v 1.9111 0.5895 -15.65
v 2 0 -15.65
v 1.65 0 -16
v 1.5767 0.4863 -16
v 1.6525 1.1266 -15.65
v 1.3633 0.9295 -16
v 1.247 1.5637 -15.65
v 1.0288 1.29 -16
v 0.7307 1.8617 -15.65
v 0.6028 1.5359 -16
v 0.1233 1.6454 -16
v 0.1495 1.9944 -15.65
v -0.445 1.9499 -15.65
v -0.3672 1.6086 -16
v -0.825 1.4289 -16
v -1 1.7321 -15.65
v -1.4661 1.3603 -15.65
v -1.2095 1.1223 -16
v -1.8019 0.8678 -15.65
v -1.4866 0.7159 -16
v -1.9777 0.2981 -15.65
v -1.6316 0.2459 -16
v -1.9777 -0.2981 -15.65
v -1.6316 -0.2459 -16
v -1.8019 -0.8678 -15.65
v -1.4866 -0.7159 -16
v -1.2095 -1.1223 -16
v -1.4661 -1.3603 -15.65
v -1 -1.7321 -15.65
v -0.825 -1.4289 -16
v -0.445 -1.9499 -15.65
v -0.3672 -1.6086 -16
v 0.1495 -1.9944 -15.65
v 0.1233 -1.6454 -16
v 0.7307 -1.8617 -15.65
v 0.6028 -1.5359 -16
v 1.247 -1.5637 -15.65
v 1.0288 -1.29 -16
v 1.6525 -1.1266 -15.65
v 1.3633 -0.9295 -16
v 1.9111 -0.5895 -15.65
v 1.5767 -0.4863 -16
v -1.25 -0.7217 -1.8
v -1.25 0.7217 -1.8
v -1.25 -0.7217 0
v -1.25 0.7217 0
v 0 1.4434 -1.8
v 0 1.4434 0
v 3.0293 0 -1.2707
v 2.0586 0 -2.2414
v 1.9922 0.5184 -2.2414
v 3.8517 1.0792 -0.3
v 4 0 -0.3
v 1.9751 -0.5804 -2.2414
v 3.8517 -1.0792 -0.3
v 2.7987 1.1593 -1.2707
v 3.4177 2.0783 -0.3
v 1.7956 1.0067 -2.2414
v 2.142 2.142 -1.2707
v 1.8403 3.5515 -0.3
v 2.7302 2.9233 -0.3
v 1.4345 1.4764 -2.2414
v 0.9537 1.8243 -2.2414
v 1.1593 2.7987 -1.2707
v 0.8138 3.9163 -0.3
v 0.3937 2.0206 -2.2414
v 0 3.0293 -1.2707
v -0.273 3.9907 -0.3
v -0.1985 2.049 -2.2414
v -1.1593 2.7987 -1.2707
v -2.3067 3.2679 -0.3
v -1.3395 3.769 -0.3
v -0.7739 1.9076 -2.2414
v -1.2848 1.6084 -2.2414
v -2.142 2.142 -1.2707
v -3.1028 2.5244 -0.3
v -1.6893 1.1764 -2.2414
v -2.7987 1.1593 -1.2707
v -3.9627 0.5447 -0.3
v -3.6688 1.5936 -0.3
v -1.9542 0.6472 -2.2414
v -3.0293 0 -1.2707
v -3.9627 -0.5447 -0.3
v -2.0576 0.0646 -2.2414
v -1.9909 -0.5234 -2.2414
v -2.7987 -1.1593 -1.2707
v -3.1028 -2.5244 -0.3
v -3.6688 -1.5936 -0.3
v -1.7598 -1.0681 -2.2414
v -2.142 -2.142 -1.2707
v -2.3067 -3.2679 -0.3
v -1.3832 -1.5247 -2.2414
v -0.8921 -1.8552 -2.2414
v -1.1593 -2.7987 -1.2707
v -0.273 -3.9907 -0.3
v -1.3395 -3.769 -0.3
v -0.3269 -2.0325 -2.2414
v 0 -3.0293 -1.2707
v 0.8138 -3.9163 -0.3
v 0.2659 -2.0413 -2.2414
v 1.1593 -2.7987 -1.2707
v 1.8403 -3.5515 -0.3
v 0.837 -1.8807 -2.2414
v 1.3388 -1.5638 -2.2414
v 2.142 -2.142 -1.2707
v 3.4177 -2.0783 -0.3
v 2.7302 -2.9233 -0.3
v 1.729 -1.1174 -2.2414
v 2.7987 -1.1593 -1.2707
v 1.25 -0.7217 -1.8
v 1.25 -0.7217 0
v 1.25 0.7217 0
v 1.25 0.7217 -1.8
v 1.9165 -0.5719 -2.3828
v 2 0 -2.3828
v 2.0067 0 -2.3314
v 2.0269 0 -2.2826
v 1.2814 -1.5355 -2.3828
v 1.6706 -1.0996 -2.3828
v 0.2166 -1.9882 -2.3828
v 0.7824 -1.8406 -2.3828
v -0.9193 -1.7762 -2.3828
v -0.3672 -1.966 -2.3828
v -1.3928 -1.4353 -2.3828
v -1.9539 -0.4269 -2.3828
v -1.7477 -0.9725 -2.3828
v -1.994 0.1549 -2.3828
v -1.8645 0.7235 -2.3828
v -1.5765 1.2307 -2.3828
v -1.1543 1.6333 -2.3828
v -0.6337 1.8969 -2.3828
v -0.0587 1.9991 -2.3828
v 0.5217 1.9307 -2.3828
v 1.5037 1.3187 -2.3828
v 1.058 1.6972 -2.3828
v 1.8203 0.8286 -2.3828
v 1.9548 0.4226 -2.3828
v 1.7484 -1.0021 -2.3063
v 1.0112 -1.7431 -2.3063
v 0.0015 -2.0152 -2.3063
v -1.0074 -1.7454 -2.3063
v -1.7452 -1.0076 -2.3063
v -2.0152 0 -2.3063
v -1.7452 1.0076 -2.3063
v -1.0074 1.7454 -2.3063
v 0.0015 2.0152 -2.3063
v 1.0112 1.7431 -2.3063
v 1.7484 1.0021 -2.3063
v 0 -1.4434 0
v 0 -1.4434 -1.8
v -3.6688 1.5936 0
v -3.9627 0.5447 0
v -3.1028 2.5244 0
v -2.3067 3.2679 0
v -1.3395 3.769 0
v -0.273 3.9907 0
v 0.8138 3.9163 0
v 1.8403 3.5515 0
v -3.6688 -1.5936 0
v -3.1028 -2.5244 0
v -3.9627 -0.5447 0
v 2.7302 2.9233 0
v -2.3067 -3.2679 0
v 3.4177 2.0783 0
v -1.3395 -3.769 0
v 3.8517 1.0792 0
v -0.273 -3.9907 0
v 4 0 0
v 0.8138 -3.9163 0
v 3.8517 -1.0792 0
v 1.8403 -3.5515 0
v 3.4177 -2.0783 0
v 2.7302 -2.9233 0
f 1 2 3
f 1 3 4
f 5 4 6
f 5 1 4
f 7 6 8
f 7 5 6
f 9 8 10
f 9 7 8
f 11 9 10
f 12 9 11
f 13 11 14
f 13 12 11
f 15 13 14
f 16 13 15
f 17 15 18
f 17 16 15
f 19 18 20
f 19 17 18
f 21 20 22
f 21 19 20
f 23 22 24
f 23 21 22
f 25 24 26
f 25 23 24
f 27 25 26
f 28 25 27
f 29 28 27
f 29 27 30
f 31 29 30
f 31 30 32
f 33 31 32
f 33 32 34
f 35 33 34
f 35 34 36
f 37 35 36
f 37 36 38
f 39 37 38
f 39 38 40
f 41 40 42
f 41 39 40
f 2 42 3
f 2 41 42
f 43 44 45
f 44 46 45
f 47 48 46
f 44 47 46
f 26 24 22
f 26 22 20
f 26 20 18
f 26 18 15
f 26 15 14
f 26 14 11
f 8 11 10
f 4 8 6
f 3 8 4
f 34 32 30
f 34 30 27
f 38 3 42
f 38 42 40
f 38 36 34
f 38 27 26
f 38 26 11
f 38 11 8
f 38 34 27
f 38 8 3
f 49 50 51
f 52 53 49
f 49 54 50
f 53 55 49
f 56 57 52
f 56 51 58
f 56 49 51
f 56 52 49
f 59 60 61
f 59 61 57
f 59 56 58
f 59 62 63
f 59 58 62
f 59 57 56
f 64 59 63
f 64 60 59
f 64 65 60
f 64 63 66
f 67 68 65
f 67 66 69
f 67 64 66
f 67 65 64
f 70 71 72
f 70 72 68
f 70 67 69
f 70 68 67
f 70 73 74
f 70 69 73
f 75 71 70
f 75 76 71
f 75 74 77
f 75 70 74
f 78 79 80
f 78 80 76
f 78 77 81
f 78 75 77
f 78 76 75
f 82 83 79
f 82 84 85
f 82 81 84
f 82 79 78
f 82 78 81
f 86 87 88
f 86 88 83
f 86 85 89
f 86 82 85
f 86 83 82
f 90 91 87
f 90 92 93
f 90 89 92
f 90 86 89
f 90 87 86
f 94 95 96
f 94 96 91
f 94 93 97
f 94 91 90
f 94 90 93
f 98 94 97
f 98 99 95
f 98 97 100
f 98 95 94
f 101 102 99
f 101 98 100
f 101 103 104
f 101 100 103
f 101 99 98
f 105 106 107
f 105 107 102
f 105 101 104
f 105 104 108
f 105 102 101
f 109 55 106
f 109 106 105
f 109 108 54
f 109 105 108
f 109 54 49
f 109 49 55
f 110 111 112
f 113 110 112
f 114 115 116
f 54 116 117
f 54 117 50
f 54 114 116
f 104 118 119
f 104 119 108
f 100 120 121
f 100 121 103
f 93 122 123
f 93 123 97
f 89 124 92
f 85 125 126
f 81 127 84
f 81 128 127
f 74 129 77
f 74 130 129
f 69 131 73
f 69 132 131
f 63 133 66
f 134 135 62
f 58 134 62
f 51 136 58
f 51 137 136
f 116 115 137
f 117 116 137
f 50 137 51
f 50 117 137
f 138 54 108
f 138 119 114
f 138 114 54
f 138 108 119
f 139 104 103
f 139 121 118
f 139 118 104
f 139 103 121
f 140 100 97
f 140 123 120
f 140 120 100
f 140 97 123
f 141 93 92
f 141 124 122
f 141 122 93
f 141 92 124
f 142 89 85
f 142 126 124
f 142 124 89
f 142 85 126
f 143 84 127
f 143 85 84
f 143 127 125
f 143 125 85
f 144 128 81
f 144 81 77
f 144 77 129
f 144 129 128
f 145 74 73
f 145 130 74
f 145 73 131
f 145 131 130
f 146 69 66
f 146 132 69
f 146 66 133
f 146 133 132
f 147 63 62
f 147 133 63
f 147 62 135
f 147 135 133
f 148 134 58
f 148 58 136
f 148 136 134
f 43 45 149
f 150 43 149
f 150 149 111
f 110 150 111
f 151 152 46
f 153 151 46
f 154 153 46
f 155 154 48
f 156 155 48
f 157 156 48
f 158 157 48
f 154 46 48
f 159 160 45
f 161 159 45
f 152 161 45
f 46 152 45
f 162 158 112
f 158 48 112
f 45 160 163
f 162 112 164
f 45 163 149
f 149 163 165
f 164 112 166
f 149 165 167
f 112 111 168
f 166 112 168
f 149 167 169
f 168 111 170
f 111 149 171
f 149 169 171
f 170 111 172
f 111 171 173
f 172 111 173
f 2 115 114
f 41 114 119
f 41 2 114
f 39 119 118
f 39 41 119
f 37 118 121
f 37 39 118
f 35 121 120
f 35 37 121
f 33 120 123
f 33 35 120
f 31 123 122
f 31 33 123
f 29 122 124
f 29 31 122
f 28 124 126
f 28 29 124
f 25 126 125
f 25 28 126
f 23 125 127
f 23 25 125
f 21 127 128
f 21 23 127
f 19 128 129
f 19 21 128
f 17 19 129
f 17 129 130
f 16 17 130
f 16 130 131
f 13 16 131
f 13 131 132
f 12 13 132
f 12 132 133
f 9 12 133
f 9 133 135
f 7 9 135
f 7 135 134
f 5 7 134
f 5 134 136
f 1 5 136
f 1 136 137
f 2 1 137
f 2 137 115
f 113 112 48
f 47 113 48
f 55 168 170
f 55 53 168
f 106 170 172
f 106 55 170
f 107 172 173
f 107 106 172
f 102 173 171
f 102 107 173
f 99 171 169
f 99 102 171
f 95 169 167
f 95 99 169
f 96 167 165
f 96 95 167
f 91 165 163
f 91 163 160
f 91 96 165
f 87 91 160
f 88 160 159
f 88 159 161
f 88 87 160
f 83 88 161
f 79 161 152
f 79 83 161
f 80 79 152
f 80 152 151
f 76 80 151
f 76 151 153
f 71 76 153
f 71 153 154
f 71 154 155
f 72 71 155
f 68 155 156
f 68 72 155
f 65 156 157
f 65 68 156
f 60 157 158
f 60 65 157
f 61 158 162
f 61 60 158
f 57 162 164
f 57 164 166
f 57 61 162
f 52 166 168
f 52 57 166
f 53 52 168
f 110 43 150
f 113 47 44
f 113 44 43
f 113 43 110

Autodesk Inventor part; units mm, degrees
ref_plane "YZ Plane" through (0, 0, 0) normal (1, 0, 0) x (0, 1, 0)
sketch "Sketch1" plane through (0, 0, 0) normal (0, 1, 0) x (-1, 0, 0)
  point P0 (0, 0)
sketch "Sketch2" plane through (0, 0, 0) normal (0, 1, 0) x (-1, 0, 0)
  line L0 (-2, -16) -> (0, -16)
  line L1 (-2, -2.3) -> (-2, -16)
  line L2 (-4, -0.3) -> (-2, -2.3)
  line L3 (-4, 0) -> (-4, -0.3)
  line L4 (0, 0) -> (-4, 0)
  line L5 (0, -16) -> (0, 0)
  line L6 (0, -16) -> (0, 0)
  line L7 (0, -19.2) -> (0, 3.2) projected
  line L8 (0.8, 0) -> (-4.8, 0) projected
  dimension "d3" = 4
  dimension "d5" = 2
  dimension "d7" = 16
  dimension "ParC" = 0.3
  dimension "d22" = 0
  dimension "d23" = 0
  dimension "d43" = 45
revolve "Revolution1" add sketch "Sketch2" angle 360 about axis through (0, 0, -16) along (0, 0, -1)
sketch "Sketch3" plane through (0, 0, 0) normal (0, 0, 1) x (1, 0, 0)
  line L0 (-1.25, 0.7217) -> (-1.25, -0.7217)
  line L1 (0, 1.4434) -> (-1.25, 0.7217)
  line L2 (1.25, 0.7217) -> (0, 1.4434)
  line L3 (1.25, -0.7217) -> (1.25, 0.7217)
  line L4 (0, -1.4434) -> (1.25, -0.7217)
  line L5 (-1.25, -0.7217) -> (0, -1.4434)
  circle A0 centre (0, 0) radius 1.25 construction
  circle A1 centre (0, 0) radius 2 construction
  dimension "d11" = 2.5
  dimension "d13" = 120
  dimension "d15" = 120
extrude "Extrusion1" cut sketch "Sketch3" against normal blind 1.8
fillet "Fillet1" radius 0.2 1 edges at (-2, 0, -2.3)
chamfer "Chamfer1" distance 0.35 angle 45 1 edges at (-2, 0, -16) measured on face at (-0.9288, -1.7713, -11.4609)
thread "Thread1" size "M4x0.7" class "6g" standard "ISO Metric profile" length 12.3
ref_plane "MSC_PF1" through (0, 0, 0) normal (1, 0, 0) x (0, 1, 0)
ref_plane "MSC_PT1" through (0, 0, 0) normal (0, 0, -1) x (-1, 0, 0)
equation "\"d3\" = 0.5 * dk"
equation "\"d5\" = 0.5 * NND"
equation "\"d7\" = NLG"
equation "\"d43\" = 0.5 * ang"
equation "\"d18\" = r"
equation "\"d19\" = 0.5 * PTC"
equation "\"d39\" = 0.5 * PTC"
equation "\"d11\" = ParS"
equation "\"d16\" = ParT"
equation "\"NND\" = 4"
equation "\"PTC\" = 0.7"
equation "\"dk\" = 8"
equation "\"ParK\" = 2.3"
equation "\"ParS\" = 2.5"
equation "\"ParT\" = 1.8"
equation "\"r\" = 0.2"
equation "\"NLG\" = 16"
equation "\"ang\" = 90deg"
equation "\"THREADDIA\" = NND"
properties part number "DIN 7991 - M4x16" material "Steel, Mild"
